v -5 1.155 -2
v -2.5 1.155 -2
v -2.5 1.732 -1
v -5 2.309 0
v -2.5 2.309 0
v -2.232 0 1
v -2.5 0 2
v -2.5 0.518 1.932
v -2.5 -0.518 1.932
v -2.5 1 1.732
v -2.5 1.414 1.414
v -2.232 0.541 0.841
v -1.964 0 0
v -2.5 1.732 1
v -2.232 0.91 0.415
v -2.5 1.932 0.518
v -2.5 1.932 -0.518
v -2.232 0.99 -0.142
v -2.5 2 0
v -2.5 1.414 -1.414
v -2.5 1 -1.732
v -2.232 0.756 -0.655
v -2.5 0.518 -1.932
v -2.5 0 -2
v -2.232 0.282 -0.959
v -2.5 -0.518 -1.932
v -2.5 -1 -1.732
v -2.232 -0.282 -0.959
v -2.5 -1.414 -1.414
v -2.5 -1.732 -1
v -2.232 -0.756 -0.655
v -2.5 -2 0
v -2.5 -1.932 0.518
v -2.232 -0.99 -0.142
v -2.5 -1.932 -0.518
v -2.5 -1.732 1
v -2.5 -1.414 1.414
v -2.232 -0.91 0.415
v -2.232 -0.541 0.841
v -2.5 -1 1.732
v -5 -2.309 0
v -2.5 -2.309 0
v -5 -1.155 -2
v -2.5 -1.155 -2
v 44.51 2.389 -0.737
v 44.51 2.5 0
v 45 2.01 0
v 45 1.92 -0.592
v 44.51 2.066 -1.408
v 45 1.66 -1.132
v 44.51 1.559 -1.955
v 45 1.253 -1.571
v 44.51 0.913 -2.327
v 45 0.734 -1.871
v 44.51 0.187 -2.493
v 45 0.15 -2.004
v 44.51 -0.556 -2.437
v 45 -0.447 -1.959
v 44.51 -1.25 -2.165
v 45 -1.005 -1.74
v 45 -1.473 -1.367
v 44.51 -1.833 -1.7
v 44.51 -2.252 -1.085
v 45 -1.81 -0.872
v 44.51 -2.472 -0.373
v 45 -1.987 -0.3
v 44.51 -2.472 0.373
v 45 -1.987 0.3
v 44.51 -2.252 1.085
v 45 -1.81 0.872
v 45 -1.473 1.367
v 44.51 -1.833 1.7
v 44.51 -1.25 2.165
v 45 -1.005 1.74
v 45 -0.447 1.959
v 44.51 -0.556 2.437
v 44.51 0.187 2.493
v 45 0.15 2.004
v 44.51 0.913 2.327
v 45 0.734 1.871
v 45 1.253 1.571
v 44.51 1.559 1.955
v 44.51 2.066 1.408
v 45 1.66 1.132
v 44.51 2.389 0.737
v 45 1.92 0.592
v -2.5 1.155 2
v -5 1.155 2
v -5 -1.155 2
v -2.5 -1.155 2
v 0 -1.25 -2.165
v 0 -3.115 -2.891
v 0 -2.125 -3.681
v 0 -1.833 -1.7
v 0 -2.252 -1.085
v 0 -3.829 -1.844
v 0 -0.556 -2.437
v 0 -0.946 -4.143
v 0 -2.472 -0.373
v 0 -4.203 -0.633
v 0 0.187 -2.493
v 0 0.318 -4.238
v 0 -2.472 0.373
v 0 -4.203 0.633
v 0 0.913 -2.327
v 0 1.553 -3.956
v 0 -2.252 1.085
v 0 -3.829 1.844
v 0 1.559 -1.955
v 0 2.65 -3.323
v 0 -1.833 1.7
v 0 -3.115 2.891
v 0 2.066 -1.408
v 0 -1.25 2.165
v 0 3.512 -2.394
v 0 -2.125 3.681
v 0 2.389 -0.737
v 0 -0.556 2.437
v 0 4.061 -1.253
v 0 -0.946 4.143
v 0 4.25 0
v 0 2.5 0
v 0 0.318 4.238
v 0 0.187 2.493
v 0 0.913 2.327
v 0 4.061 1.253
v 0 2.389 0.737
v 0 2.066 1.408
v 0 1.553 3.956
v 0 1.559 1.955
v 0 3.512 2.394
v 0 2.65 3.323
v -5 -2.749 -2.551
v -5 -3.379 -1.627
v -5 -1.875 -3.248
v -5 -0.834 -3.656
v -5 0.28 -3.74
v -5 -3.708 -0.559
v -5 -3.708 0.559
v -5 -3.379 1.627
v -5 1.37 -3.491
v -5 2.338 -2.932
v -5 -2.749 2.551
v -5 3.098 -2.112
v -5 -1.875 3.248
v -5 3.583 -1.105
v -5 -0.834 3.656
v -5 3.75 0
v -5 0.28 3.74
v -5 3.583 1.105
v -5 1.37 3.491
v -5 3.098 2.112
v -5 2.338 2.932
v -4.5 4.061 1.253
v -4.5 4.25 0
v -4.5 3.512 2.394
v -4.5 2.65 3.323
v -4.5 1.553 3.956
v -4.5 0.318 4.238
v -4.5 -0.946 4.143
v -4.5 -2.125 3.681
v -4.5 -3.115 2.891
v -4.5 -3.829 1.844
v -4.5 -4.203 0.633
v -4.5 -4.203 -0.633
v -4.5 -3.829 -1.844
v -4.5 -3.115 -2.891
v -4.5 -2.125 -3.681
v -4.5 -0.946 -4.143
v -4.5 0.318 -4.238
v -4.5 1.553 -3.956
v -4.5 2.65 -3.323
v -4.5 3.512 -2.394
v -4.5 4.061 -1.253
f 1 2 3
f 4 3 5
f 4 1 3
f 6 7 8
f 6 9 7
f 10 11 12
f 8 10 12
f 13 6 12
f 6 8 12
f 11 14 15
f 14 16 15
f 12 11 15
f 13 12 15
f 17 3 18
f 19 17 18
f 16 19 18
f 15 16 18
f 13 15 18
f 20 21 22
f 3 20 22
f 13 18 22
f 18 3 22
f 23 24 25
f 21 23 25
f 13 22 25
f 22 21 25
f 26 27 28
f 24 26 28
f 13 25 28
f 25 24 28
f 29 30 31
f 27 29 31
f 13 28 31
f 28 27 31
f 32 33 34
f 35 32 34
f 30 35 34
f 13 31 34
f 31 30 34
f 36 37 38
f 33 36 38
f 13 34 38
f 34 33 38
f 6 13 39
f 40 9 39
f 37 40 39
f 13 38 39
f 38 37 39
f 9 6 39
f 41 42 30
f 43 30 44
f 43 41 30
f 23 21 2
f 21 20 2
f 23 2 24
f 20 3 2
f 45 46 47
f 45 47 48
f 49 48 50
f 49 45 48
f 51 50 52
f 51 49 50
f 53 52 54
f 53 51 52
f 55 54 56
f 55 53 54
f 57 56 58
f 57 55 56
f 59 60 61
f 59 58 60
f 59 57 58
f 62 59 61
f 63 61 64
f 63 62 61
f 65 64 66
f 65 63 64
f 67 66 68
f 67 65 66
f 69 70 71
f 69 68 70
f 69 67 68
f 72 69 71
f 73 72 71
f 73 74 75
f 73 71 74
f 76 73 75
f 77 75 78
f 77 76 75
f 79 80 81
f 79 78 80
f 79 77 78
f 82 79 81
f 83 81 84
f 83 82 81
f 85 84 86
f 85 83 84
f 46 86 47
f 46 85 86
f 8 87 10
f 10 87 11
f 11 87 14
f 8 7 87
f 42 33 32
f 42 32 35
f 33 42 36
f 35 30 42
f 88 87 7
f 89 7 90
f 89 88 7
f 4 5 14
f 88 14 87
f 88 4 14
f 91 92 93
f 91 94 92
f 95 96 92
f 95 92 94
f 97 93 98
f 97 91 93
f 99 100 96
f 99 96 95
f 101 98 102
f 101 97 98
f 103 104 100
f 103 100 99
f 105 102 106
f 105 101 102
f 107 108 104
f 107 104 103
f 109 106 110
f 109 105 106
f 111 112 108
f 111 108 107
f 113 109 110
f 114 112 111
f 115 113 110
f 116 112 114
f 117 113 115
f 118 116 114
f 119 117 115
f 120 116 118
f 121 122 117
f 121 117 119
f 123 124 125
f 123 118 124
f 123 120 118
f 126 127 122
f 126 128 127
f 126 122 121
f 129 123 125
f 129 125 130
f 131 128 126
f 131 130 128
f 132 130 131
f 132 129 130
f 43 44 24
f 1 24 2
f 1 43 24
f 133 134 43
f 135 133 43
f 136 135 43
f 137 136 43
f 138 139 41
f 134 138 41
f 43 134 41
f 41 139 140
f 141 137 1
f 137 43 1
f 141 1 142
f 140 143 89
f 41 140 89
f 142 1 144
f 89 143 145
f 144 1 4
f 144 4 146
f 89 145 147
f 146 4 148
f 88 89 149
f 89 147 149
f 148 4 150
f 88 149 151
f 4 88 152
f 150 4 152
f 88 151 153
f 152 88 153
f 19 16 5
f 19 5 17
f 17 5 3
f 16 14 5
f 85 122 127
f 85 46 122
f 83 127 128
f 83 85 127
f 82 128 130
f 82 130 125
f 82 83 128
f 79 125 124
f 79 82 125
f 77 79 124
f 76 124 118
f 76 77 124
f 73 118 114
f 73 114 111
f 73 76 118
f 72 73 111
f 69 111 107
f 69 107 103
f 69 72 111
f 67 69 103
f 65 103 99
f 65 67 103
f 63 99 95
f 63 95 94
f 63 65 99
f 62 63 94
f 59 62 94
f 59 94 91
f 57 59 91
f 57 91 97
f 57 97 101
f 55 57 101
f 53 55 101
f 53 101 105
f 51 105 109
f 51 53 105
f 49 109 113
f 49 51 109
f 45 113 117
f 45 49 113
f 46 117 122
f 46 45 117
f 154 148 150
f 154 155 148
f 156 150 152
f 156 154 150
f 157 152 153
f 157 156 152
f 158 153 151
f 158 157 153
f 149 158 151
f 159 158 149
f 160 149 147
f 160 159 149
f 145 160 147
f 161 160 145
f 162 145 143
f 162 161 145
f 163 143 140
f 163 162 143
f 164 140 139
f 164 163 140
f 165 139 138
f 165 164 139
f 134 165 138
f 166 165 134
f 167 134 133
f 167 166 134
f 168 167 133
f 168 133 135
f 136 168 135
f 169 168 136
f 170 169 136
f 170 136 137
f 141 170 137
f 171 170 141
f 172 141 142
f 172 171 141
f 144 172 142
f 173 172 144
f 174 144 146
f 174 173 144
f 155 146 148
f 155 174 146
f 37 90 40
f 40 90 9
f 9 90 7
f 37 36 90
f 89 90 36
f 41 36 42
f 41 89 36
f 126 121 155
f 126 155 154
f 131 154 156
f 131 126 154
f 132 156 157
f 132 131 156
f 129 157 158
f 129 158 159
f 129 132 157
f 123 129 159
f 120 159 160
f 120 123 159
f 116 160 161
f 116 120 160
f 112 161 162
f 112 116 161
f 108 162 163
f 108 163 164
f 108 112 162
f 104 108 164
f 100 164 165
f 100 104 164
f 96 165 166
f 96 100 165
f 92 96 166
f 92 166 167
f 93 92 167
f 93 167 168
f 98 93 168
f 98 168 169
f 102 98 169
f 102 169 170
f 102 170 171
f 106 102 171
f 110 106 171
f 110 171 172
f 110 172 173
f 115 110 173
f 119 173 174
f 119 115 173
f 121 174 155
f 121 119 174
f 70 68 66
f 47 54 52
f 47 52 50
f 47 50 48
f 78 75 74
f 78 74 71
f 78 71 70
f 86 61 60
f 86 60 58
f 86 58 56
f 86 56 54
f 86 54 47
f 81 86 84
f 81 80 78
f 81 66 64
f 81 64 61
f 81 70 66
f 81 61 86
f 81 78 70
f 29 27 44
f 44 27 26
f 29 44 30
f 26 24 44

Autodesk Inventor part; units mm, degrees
sketch "Sketch_2" plane through (0, 0, 0) normal (0, 0, 1) x (1, 0, 0)
  line L0 (45, 0) -> (-5, 0)
  line L1 (-5, 0) -> (-5, 3.75)
  line L2 (-5, 3.75) -> (-4.5, 4.25)
  line L3 (-4.5, 4.25) -> (0, 4.25)
  line L4 (0, 4.25) -> (0, 2.5)
  line L5 (0, 2.5) -> (44.5095, 2.5)
  line L6 (44.5095, 2.5) -> (45, 2.0095)
  line L7 (45, 2.0095) -> (45, 0)
  line L8 (45, 0) -> (-5, 0)
revolve "Revolution1" add sketch "Sketch_2" angle 360 about axis through (45, 0, 0) along (1, 0, 0)
thread "Thread1" size "M5x0.8" class "6g" standard "ISO Metric profile" length 21.5095
sketch "Sketch2" plane through (-5, 0, 0) normal (-1, 0, 0) x (0, 0, 1)
  point P0 (0, 0)
hole "Hole1" at (-5, 0, 0) direction (1, 0, 0) diameter 4 depth 2.5 tip angle 150
sketch "Sketch_3" plane through (-5, 0, 0) normal (1, 0, 0) x (0, 0, -1)
  line L0 (-2, -1.1547) -> (0, -2.3094)
  line L1 (0, -2.3094) -> (2, -1.1547)
  line L2 (2, -1.1547) -> (2, 1.1547)
  line L3 (2, 1.1547) -> (0, 2.3094)
  line L4 (0, 2.3094) -> (-2, 1.1547)
  line L5 (-2, 1.1547) -> (-2, -1.1547)
extrude "Extrusion1" cut sketch "Sketch_3" along normal blind 2.5
ref_plane "bolt_to_nut_XY" through (45, 0, 0) normal (1, 0, 0) x (0, 0, -1)
ref_plane "bolt_to_nut_YZ" through (45, 0, 0) normal (0, 0, -1) x (0, 1, 0)
ref_plane "bolt_to_nut_ZX" through (45, 0, 0) normal (0, 1, 0) x (1, 0, 0)
ref_plane "screw1_XY" through (0, 0, 0) normal (1, 0, 0) x (0, 0, -1)
ref_plane "screw1_YZ" through (0, 0, 0) normal (0, 0, -1) x (0, 1, 0)
ref_plane "screw1_ZX" through (0, 0, 0) normal (0, 1, 0) x (1, 0, 0)
properties part number "CB5-45" material "鋼、炭素鋼"
